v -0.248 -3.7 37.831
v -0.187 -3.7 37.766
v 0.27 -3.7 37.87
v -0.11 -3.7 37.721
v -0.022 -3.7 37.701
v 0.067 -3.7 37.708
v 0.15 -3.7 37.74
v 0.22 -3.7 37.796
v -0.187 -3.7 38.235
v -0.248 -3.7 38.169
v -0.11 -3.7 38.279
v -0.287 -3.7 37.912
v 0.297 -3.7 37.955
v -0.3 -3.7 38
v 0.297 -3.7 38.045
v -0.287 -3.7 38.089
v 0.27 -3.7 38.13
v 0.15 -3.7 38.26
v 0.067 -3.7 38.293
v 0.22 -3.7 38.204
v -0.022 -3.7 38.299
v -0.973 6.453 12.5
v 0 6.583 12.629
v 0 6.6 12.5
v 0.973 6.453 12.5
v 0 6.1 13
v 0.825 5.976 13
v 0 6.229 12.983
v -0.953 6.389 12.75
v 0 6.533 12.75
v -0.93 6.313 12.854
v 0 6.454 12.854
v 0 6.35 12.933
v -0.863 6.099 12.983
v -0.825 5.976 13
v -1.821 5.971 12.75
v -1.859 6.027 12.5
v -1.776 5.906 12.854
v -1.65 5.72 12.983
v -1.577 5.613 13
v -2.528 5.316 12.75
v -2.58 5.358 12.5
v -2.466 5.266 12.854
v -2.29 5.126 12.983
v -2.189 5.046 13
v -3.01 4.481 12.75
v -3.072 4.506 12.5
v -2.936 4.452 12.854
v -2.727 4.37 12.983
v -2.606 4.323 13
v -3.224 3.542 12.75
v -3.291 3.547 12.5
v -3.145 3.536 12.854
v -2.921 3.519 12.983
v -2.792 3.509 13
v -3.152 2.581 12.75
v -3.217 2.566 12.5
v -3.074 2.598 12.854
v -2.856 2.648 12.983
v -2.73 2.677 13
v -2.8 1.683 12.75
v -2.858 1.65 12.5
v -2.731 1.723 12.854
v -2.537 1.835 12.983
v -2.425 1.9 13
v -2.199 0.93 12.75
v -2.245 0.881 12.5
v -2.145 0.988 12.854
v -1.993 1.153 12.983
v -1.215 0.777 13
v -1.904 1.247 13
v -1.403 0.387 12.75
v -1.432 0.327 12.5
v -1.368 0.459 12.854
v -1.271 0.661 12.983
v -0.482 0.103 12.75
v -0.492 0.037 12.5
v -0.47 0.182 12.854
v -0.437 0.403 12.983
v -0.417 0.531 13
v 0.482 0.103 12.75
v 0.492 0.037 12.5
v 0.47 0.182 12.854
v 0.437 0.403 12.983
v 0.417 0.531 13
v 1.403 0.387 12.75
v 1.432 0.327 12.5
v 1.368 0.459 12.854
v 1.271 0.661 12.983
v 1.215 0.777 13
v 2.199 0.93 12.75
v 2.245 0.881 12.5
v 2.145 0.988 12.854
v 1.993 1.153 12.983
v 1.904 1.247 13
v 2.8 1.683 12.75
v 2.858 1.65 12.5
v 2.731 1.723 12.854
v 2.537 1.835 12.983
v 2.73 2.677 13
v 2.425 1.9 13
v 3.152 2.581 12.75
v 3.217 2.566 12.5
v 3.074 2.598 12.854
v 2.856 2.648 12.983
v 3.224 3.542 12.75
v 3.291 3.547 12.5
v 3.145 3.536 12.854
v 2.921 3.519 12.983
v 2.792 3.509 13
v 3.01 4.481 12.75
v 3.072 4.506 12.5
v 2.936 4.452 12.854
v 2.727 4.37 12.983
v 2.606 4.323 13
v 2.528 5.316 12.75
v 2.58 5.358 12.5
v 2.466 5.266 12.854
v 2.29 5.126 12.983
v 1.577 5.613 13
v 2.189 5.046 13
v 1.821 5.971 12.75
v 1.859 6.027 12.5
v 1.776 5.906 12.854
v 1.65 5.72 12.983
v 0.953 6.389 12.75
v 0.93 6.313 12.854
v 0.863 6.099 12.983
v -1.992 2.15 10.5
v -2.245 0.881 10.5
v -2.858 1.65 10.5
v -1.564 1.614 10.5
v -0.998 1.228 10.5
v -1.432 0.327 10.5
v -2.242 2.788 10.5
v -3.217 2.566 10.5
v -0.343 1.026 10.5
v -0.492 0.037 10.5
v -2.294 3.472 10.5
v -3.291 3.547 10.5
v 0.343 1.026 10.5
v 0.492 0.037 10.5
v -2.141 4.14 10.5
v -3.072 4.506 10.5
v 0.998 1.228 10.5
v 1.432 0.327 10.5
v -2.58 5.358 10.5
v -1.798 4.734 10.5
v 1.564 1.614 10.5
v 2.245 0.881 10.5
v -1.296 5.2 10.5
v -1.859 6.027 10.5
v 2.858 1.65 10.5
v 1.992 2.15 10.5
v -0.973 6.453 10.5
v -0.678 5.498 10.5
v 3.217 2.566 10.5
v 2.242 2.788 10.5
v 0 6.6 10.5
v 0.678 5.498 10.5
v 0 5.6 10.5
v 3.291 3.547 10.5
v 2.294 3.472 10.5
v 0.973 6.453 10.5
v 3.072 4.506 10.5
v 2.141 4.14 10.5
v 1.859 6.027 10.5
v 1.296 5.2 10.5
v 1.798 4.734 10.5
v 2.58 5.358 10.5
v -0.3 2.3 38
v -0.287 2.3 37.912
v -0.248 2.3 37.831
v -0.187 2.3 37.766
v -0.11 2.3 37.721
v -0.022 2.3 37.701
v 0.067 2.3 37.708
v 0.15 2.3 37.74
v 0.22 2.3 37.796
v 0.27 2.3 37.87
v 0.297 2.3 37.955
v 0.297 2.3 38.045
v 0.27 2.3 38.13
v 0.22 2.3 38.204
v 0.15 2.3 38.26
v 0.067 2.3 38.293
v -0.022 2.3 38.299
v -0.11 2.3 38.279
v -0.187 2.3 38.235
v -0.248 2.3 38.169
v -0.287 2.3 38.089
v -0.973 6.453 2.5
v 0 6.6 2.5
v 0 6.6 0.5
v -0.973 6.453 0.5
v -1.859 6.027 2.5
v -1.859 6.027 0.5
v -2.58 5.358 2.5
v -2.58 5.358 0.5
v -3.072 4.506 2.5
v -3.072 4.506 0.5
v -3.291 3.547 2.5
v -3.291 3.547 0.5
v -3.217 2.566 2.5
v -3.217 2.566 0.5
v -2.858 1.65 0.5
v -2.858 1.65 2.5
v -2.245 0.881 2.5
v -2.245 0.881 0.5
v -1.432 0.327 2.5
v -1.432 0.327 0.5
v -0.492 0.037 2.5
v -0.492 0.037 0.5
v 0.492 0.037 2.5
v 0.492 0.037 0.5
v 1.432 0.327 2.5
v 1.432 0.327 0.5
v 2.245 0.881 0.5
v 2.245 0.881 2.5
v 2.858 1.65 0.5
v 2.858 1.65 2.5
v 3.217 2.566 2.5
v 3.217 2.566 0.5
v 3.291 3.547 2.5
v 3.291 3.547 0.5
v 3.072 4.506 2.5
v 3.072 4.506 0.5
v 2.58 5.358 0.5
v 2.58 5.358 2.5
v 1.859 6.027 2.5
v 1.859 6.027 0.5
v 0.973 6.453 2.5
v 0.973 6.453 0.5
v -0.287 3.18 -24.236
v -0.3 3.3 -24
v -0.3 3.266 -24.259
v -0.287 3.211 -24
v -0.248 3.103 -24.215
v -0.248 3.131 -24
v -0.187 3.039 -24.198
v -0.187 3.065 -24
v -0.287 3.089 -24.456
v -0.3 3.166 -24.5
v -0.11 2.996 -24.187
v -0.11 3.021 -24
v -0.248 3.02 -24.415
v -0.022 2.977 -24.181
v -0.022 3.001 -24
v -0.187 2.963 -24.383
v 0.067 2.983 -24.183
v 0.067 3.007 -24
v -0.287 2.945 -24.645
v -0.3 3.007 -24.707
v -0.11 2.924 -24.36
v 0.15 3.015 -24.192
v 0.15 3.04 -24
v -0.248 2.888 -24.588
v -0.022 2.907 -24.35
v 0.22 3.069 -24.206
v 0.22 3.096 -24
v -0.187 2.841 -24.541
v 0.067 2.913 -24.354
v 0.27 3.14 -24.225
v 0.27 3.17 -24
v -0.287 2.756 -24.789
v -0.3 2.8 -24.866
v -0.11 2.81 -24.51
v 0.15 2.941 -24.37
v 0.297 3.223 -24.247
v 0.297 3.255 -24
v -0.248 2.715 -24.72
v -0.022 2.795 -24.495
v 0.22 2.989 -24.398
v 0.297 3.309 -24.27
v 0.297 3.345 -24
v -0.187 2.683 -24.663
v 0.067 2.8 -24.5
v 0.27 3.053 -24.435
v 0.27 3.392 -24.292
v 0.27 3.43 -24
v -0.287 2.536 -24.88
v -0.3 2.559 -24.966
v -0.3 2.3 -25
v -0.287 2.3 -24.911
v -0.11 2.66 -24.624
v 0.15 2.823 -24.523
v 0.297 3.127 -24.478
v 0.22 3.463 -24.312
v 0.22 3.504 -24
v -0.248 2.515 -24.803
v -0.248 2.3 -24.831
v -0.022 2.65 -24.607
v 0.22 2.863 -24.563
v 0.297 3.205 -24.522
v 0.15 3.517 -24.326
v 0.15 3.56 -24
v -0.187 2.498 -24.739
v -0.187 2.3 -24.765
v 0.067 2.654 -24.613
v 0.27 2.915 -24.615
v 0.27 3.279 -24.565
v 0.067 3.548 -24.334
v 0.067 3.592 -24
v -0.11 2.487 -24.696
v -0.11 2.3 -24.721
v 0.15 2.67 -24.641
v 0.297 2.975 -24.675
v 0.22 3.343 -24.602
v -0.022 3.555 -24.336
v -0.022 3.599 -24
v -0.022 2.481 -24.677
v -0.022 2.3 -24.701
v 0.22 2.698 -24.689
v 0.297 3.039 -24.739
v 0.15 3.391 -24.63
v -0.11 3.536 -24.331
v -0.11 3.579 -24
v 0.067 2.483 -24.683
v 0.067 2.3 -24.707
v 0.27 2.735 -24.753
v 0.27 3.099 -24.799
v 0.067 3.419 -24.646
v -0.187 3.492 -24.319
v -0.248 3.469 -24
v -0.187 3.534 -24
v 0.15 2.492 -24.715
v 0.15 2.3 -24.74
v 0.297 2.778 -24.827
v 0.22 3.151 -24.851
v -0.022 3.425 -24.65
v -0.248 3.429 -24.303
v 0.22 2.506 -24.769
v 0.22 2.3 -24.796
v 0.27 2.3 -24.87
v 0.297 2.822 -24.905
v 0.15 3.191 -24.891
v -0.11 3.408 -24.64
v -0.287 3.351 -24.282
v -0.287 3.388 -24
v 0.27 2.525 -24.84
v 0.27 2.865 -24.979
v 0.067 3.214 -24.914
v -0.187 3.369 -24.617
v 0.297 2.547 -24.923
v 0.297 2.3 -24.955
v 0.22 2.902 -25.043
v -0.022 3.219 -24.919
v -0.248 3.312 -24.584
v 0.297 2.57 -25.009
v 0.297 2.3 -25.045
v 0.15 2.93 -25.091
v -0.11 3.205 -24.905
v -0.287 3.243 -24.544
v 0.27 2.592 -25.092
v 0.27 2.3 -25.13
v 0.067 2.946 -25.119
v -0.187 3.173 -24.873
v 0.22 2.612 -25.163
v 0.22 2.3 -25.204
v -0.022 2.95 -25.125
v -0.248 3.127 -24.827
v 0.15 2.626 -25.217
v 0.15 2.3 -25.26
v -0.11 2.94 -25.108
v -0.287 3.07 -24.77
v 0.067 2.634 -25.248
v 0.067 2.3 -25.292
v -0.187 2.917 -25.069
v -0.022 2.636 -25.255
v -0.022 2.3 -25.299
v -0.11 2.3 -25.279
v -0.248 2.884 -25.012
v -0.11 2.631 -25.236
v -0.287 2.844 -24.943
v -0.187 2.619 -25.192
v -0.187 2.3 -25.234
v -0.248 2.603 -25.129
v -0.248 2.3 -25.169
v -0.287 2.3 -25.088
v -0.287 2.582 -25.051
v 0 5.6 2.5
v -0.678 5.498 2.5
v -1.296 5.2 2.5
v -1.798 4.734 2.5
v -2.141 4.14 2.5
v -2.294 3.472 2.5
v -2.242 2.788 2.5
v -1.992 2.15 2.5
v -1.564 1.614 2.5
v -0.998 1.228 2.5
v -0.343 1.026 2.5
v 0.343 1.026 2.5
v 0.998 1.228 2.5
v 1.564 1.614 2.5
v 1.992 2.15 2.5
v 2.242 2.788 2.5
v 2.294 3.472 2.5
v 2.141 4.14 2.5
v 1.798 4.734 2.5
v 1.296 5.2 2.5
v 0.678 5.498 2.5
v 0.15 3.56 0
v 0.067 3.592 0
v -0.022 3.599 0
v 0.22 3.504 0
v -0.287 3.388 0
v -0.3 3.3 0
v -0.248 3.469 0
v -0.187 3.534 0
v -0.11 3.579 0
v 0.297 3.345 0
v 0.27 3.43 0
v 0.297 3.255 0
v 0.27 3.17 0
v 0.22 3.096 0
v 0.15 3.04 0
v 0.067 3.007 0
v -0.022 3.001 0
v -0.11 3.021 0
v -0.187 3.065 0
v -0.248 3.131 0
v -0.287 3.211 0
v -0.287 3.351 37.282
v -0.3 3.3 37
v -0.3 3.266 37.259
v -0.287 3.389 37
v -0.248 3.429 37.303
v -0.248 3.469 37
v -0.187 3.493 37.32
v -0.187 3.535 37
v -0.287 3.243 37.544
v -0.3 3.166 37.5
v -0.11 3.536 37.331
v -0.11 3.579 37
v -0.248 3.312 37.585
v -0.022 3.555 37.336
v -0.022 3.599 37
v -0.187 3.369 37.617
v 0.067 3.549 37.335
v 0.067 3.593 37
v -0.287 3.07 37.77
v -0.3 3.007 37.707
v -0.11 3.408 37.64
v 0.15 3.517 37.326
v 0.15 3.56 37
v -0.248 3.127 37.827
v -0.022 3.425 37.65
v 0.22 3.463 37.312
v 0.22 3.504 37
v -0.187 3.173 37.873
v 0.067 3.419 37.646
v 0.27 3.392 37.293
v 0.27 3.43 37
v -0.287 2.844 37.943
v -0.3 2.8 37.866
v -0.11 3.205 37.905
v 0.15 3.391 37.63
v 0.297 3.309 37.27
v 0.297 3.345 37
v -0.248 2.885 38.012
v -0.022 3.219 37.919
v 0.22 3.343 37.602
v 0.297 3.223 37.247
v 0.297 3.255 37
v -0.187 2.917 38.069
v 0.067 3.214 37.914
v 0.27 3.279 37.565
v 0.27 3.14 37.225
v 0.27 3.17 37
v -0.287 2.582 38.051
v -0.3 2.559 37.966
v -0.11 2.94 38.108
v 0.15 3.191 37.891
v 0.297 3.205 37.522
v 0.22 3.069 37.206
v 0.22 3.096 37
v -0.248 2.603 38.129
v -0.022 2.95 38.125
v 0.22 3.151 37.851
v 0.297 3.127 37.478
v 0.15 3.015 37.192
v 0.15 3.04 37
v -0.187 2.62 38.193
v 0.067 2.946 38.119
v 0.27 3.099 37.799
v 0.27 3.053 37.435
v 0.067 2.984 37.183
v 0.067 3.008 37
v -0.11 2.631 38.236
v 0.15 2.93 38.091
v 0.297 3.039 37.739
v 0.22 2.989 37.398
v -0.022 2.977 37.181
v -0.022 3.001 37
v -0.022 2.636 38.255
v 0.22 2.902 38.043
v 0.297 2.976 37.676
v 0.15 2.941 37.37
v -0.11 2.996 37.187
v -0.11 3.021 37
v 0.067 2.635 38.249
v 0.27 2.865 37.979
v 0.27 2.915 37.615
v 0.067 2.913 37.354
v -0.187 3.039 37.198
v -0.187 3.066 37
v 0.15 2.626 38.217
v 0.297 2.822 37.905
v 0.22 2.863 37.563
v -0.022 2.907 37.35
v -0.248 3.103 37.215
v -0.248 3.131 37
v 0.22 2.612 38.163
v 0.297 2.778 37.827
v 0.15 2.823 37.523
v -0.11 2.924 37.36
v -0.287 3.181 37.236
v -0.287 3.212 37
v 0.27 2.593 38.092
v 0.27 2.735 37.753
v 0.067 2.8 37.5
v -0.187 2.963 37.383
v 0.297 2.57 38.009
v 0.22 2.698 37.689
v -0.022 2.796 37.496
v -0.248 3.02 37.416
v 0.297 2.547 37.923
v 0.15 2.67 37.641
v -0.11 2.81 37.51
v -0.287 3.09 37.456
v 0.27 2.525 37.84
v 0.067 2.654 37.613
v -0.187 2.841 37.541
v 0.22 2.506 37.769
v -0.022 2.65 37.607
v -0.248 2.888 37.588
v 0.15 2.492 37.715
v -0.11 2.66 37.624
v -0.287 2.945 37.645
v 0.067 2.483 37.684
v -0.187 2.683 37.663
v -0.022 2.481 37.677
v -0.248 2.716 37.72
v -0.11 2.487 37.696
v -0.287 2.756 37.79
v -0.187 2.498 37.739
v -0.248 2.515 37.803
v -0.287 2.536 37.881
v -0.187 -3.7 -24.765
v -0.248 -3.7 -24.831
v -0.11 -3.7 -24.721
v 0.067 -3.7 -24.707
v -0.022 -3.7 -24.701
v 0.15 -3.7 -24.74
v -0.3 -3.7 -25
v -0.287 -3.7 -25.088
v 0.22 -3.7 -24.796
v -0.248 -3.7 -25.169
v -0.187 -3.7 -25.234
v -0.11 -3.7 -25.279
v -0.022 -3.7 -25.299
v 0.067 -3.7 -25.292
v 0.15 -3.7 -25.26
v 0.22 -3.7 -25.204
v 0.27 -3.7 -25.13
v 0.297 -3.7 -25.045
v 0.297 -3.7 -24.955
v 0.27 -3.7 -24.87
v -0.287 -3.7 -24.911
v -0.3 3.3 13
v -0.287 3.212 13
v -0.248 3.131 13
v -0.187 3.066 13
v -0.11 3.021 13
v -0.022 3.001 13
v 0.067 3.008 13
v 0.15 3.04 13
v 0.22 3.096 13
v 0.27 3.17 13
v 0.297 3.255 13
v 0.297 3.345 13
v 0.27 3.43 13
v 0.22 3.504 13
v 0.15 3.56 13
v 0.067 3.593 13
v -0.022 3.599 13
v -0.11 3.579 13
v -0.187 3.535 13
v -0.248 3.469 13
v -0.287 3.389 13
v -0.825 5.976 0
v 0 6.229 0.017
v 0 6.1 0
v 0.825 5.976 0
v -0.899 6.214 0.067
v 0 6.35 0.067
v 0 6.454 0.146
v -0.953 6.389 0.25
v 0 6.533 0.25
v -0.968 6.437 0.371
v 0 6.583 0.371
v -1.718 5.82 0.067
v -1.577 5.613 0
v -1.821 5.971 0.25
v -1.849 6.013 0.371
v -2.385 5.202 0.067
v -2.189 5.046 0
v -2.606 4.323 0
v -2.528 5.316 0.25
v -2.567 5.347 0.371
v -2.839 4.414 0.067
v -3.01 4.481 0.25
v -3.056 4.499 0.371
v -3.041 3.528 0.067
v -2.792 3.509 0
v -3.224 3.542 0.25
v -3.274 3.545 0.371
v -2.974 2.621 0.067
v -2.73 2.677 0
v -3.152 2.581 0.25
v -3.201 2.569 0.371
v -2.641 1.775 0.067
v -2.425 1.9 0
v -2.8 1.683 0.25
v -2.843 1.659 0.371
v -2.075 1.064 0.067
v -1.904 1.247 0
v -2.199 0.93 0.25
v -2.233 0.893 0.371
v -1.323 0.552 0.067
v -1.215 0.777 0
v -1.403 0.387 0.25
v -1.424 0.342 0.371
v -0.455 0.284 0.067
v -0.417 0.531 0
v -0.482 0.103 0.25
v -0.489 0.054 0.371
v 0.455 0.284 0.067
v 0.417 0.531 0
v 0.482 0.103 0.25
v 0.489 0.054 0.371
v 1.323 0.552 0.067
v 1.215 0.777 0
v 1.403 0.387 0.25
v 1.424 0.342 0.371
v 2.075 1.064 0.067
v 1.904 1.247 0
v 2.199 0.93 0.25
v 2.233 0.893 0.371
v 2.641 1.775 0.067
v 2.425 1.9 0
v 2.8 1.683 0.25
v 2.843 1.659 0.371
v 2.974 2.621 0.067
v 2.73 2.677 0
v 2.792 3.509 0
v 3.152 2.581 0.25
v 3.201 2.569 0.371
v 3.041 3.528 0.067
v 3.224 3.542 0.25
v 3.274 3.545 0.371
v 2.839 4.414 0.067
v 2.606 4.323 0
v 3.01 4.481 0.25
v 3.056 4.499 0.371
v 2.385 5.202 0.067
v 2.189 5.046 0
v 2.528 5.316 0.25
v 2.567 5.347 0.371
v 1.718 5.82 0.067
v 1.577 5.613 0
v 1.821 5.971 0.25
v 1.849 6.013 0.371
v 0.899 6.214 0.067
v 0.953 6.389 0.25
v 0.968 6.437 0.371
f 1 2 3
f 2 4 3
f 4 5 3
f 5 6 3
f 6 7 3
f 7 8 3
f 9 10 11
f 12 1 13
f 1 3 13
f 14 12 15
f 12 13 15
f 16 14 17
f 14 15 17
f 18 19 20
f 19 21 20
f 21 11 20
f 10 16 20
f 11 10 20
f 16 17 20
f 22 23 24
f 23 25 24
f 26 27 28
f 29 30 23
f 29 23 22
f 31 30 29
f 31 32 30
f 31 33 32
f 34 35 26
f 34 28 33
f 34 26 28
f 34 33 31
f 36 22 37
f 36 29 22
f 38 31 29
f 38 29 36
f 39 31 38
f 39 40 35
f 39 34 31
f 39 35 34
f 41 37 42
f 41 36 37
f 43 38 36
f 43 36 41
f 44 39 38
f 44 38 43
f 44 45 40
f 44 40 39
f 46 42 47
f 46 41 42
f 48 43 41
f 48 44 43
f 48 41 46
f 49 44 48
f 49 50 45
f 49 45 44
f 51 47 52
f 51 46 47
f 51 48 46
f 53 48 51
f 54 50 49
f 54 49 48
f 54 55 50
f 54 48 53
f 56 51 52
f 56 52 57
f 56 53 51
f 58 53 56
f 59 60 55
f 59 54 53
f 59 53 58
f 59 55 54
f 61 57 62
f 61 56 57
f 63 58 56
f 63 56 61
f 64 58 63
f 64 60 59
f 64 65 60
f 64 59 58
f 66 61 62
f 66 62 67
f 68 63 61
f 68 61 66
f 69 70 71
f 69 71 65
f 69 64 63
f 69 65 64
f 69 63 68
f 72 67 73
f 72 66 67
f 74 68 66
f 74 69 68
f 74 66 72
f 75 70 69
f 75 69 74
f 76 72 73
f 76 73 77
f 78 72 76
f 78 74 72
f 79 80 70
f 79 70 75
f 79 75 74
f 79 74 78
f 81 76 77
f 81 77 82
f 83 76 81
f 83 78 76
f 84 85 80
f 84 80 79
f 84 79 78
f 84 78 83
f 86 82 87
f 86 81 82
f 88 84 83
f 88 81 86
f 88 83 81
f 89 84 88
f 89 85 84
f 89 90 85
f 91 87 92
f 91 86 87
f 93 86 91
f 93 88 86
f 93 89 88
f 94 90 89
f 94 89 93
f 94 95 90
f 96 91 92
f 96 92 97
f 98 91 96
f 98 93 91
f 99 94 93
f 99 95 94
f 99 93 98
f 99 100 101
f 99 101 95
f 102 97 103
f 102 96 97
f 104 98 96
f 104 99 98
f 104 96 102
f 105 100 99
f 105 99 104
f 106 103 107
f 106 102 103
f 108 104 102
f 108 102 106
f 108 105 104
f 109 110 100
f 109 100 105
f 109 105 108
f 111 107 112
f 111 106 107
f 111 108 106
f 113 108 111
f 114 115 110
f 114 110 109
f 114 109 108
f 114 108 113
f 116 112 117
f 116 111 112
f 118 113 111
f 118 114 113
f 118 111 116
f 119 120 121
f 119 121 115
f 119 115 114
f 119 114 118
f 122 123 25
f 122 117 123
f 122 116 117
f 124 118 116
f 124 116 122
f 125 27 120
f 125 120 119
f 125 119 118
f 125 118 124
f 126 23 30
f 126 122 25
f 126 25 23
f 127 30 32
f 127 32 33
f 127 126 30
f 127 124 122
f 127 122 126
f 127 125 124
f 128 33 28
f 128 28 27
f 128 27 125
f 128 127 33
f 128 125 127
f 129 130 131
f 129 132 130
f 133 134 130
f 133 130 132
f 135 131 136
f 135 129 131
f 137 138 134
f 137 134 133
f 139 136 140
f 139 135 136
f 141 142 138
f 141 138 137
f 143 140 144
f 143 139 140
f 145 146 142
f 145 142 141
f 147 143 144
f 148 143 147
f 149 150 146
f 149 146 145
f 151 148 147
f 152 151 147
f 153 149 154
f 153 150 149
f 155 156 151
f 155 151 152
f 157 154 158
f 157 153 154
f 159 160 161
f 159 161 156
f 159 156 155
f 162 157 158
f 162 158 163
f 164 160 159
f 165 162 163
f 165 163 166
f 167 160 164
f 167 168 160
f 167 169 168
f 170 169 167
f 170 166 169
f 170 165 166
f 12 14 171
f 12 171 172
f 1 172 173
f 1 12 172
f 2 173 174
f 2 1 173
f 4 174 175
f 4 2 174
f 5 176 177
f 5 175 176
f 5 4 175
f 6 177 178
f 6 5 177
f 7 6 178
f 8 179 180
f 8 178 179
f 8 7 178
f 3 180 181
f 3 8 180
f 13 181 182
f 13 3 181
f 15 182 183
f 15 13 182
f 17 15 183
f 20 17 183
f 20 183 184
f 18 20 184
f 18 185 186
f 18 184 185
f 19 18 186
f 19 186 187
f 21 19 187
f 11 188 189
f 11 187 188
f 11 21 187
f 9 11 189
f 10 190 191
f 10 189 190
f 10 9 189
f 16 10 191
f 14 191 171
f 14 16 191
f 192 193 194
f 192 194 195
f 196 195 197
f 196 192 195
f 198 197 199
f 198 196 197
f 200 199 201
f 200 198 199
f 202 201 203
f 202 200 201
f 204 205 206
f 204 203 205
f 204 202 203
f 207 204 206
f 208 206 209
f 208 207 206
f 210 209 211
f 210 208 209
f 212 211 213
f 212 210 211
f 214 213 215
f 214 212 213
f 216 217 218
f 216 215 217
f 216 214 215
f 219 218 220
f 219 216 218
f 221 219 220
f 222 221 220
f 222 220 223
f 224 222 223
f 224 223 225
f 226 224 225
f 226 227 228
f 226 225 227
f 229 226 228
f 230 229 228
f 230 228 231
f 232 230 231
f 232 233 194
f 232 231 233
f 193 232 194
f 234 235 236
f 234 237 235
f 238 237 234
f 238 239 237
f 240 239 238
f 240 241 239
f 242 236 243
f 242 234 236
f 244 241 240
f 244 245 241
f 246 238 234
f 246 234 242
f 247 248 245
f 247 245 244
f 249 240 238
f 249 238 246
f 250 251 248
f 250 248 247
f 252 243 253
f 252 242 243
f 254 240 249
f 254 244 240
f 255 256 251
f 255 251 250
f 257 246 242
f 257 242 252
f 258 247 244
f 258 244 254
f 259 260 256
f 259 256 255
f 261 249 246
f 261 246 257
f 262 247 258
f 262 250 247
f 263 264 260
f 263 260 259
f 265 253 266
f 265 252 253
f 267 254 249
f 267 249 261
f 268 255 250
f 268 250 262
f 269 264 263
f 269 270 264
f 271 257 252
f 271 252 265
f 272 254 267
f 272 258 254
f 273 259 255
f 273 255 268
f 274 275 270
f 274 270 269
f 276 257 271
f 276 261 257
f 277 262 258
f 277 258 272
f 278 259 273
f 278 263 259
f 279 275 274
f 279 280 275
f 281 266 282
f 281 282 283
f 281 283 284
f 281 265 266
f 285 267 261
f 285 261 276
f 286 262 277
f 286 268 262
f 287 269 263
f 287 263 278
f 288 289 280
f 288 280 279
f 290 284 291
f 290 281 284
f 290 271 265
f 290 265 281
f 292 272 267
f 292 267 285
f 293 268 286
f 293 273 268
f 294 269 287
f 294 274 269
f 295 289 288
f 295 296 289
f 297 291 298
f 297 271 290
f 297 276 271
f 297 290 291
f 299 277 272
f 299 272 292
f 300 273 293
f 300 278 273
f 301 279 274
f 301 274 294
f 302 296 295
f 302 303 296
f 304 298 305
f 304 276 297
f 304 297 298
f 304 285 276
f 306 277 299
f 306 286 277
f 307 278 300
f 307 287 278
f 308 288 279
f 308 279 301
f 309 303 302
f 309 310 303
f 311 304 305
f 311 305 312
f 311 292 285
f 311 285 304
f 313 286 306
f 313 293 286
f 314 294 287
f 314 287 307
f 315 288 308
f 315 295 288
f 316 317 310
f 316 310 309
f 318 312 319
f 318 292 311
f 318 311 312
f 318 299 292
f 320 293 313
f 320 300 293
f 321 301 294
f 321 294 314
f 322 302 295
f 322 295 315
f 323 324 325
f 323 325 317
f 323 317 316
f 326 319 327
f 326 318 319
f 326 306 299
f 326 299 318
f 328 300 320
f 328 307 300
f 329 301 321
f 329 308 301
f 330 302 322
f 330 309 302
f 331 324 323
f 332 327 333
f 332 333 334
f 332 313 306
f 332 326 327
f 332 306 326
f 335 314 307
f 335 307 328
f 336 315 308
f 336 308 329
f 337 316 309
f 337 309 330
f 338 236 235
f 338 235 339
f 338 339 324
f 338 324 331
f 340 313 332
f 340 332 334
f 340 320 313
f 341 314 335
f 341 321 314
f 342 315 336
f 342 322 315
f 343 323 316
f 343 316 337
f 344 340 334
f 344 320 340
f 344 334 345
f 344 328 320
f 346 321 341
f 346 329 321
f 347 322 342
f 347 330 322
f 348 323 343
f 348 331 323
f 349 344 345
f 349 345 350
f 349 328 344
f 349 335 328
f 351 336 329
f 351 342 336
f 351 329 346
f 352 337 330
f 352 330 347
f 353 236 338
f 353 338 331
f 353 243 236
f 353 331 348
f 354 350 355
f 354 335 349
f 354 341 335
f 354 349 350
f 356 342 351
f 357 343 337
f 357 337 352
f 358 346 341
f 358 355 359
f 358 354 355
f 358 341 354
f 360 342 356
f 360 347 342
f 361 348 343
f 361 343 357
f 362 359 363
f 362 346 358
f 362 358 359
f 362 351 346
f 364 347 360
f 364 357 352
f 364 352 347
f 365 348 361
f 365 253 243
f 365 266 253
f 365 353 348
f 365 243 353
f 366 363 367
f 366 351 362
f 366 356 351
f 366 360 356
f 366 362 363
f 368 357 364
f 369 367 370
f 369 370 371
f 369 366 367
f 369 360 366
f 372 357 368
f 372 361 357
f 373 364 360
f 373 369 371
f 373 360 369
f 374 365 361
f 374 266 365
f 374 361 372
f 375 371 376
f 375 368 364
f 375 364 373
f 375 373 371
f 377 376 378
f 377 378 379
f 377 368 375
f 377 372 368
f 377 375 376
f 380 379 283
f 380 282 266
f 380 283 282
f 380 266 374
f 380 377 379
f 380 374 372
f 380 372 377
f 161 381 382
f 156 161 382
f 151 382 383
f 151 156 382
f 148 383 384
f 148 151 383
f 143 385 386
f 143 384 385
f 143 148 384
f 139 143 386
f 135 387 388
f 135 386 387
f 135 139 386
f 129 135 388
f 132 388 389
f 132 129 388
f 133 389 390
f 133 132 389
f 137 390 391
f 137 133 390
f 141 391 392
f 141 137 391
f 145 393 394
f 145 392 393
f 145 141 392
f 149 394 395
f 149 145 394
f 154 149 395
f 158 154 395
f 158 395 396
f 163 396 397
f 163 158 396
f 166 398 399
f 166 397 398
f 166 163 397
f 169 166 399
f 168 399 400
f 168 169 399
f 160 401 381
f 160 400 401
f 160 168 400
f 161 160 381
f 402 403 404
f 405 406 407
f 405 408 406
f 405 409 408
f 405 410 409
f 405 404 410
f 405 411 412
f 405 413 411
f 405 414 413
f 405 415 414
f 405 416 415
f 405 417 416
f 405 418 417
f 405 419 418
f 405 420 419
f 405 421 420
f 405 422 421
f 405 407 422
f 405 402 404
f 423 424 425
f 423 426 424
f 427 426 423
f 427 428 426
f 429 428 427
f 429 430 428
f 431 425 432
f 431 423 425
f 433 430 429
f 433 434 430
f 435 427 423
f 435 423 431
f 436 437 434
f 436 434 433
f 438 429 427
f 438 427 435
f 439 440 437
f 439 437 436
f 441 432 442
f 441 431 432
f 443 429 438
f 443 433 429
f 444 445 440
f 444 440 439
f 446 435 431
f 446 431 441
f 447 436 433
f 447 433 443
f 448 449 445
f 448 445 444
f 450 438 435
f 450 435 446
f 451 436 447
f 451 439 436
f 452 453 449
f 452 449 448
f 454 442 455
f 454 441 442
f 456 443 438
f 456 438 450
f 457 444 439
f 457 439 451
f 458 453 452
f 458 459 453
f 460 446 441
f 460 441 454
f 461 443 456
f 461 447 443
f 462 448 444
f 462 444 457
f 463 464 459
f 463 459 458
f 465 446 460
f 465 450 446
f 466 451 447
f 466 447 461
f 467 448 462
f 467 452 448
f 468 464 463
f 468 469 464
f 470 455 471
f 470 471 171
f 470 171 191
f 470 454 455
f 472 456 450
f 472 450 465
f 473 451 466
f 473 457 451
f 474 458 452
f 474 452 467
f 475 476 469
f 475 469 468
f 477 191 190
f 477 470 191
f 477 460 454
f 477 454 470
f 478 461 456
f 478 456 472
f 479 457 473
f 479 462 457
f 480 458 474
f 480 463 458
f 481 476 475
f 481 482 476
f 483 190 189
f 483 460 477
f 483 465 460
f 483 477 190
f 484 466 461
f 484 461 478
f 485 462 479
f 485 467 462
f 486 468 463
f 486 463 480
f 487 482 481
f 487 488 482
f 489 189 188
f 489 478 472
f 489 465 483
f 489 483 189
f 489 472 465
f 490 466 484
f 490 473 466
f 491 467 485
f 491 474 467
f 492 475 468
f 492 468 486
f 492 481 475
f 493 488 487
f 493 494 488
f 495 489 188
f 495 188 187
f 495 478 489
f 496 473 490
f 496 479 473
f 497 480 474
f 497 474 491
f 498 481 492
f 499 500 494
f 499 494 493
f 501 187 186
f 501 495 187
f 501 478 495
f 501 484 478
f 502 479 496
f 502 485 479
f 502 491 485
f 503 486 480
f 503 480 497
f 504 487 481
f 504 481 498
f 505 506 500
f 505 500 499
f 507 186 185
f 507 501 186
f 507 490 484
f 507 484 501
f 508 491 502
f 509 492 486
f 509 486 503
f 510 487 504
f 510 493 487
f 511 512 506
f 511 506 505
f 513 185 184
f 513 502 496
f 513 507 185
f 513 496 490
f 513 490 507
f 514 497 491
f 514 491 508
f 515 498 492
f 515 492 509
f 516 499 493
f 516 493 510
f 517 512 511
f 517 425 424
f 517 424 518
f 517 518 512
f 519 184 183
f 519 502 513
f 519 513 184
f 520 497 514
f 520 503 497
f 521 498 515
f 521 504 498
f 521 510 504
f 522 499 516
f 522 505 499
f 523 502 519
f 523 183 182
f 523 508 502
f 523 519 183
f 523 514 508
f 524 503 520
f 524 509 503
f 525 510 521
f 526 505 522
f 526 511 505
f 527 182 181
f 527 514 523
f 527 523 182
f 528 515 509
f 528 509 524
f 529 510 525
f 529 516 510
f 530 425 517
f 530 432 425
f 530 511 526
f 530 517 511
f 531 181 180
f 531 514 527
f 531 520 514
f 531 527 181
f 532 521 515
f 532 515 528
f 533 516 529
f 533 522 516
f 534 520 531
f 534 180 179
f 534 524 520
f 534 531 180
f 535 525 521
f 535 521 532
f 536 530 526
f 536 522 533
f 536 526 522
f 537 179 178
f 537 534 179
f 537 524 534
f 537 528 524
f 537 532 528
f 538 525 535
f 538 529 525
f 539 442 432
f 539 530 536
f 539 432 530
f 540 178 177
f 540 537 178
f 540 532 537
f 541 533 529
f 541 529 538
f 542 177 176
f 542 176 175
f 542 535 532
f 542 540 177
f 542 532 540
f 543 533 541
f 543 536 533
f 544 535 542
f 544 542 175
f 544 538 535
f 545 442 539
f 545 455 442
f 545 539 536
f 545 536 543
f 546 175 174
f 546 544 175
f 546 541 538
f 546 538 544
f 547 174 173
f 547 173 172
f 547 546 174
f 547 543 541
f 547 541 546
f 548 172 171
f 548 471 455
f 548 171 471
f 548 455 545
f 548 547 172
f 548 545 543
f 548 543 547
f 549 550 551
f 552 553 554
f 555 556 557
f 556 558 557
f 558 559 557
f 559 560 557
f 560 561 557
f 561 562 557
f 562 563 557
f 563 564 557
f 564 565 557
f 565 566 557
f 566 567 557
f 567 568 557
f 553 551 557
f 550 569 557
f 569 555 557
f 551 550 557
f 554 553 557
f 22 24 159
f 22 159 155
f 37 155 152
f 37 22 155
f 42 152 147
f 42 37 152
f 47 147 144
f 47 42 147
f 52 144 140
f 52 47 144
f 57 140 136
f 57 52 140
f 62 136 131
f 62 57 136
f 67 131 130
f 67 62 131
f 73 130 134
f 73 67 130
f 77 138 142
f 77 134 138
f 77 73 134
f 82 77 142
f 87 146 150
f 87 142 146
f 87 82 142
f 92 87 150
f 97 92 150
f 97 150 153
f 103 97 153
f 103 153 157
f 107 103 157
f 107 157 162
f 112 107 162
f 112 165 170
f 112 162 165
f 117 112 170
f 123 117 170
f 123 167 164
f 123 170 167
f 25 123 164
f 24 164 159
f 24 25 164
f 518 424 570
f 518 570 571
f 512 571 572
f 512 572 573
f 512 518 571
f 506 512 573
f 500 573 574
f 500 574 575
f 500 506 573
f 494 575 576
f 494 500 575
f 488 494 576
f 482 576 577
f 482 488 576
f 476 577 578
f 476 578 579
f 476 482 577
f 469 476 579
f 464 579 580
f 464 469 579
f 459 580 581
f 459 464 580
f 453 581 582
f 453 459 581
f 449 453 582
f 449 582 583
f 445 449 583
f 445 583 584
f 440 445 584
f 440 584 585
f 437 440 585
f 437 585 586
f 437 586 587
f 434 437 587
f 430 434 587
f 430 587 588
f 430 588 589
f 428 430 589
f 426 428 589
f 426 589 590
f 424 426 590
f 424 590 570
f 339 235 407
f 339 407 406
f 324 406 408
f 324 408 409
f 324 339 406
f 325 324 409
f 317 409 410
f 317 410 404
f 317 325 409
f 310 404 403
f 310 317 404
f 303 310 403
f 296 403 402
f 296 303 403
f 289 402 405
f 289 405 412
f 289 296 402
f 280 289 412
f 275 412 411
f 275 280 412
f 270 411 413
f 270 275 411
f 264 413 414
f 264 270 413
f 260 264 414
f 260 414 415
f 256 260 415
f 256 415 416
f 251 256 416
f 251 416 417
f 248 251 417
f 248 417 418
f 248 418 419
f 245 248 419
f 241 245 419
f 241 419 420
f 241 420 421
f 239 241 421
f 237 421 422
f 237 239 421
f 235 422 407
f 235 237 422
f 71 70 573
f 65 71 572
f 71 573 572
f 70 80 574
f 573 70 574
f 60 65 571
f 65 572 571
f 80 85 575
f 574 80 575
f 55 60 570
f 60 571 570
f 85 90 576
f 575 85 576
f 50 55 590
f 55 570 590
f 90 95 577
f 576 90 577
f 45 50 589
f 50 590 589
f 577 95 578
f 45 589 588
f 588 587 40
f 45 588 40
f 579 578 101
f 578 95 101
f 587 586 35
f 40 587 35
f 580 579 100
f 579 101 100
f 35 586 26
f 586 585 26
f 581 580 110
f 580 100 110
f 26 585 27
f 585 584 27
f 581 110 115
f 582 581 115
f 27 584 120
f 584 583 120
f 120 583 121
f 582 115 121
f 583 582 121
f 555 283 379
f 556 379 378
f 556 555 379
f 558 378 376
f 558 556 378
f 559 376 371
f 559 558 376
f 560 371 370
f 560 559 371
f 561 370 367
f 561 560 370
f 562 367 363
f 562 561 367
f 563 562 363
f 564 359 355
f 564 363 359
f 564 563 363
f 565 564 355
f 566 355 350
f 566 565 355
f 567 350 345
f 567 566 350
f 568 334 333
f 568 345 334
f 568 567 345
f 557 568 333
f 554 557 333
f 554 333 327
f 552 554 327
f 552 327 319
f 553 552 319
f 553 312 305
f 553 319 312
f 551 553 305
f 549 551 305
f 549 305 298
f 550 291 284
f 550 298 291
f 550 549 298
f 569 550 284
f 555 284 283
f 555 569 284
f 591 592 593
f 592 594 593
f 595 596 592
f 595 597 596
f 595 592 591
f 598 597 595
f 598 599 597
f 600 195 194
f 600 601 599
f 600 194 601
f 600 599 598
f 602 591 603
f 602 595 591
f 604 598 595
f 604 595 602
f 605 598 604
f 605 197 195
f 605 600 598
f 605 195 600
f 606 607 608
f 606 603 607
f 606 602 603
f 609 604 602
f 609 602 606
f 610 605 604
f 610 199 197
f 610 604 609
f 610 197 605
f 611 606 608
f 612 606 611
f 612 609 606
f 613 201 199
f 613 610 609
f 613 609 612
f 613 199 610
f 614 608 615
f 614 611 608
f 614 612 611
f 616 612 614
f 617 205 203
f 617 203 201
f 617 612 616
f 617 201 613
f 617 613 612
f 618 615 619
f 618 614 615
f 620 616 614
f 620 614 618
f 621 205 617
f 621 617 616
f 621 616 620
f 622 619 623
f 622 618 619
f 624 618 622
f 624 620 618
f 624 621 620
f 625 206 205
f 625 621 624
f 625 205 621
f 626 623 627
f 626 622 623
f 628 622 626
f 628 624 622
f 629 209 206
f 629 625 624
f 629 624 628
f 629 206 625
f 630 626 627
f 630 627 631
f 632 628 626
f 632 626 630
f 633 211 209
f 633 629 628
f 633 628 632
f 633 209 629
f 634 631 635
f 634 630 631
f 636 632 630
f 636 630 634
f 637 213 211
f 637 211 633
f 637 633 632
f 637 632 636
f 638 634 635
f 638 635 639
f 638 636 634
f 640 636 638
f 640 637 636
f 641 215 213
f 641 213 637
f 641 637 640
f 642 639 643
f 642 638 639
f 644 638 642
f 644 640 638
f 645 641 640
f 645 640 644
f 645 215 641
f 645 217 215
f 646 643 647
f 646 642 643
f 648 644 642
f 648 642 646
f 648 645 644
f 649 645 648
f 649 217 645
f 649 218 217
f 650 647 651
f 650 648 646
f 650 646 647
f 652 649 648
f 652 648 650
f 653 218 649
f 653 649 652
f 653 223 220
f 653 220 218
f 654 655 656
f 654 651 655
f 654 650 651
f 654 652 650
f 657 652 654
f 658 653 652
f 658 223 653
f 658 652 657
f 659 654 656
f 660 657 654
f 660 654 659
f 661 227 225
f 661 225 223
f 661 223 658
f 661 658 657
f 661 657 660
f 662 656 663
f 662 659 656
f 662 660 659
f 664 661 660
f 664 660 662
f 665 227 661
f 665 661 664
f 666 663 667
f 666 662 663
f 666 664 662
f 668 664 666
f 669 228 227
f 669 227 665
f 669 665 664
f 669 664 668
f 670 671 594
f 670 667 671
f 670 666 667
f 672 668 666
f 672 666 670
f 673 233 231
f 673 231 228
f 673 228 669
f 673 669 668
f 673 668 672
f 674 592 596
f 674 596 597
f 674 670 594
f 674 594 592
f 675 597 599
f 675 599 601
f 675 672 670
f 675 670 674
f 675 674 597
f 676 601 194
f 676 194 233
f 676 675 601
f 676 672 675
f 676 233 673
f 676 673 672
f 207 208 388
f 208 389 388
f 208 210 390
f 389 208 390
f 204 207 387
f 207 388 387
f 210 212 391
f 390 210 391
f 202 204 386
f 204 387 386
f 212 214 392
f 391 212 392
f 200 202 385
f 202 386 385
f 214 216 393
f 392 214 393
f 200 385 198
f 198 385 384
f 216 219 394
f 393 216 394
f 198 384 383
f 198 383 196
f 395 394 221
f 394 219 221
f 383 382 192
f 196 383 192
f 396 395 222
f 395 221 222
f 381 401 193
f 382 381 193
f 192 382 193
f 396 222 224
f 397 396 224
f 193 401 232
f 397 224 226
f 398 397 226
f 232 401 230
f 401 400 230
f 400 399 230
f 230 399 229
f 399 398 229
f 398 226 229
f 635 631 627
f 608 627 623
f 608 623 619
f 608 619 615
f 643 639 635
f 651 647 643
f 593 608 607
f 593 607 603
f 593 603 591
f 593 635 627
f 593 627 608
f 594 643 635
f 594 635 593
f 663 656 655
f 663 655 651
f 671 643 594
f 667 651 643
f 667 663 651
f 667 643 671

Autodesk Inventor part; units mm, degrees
ref_plane "YZ Plane" through (0, 0, 0) normal (1, 0, 0) x (0, 1, 0)
ref_plane "XZ Plane" through (0, 0, 0) normal (0, 1, 0) x (-1, 0, 0)
ref_plane "XY Plane" through (0, 0, 0) normal (0, 0, 1) x (1, 0, 0)
sketch "Sketch1" plane through (0, 0, 0) normal (1, 0, 0) x (0, 1, 0)
  line L0 (0.5, 0) -> (6.1, 0)
  line L1 (6.6, 0.5) -> (6.6, 2.5)
  line L2 (6.6, 2.5) -> (5.6, 2.5)
  line L3 (5.6, 2.5) -> (5.6, 10.5)
  line L4 (5.6, 10.5) -> (6.6, 10.5)
  line L5 (6.6, 10.5) -> (6.6, 12.5)
  line L6 (6.1, 13) -> (0.5, 13)
  line L7 (0, 12.5) -> (0, 10.5)
  line L8 (0, 10.5) -> (1, 10.5)
  line L9 (1, 10.5) -> (1, 2.5)
  line L10 (1, 2.5) -> (0, 2.5)
  line L11 (0, 2.5) -> (0, 0.5)
  arc A0 (6.6, 12.5) -> (6.1, 13) centre (6.1, 12.5) ccw
  arc A1 (0.5, 13) -> (0, 12.5) centre (0.5, 12.5) ccw
  arc A2 (6.1, 0) -> (6.6, 0.5) centre (6.1, 0.5) ccw
  arc A3 (0, 0.5) -> (0.5, 0) centre (0.5, 0.5) ccw
  line L12 (3.3, 13) -> (3.3, 0)
  point P0 (6.6, 13)
sketch "Sketch2" plane through (0, 0, 0) normal (1, 0, 0) x (0, 1, 0)
  line L0 (3.3, 13) -> (3.3, 37)
  line L1 (2.3, 38) -> (-3.7, 38)
  arc A0 (3.3, 37) -> (2.3, 38) centre (2.3, 37) ccw
sketch "Sketch3" plane through (0, 0, 0) normal (1, 0, 0) x (0, 1, 0)
  line L0 (3.3, 0) -> (3.3, -24)
  line L1 (2.3, -25) -> (-3.7, -25)
  arc A0 (2.3, -25) -> (3.3, -24) centre (2.3, -24) ccw
sketch "Sketch4" plane through (0, 0, 0) normal (0, 1, 0) x (-1, 0, 0)
  circle A0 centre (0, 38.0001) radius 0.3
  point P0 (0, 0)
sketch "Sketch5" plane through (0, 0, 0) normal (0, 1, 0) x (-1, 0, 0)
  circle A0 centre (0, -24.9999) radius 0.3
  point P0 (0, 0)
sweep "Sweep1" add profiles "Sketch4" path "Sketch2"
sweep "Sweep2" add profiles "Sketch5" path "Sketch3" separate body
revolve "Revolution2" add sketch "Sketch1" angle 360 about axis through (0, 3.3, 13) along (0, 0, -1) bodies 1 contours L12 L6 A0 L5 L4 L3 L2 L1 A2 L0
properties part number "МЛТ-1" material "Copper"
